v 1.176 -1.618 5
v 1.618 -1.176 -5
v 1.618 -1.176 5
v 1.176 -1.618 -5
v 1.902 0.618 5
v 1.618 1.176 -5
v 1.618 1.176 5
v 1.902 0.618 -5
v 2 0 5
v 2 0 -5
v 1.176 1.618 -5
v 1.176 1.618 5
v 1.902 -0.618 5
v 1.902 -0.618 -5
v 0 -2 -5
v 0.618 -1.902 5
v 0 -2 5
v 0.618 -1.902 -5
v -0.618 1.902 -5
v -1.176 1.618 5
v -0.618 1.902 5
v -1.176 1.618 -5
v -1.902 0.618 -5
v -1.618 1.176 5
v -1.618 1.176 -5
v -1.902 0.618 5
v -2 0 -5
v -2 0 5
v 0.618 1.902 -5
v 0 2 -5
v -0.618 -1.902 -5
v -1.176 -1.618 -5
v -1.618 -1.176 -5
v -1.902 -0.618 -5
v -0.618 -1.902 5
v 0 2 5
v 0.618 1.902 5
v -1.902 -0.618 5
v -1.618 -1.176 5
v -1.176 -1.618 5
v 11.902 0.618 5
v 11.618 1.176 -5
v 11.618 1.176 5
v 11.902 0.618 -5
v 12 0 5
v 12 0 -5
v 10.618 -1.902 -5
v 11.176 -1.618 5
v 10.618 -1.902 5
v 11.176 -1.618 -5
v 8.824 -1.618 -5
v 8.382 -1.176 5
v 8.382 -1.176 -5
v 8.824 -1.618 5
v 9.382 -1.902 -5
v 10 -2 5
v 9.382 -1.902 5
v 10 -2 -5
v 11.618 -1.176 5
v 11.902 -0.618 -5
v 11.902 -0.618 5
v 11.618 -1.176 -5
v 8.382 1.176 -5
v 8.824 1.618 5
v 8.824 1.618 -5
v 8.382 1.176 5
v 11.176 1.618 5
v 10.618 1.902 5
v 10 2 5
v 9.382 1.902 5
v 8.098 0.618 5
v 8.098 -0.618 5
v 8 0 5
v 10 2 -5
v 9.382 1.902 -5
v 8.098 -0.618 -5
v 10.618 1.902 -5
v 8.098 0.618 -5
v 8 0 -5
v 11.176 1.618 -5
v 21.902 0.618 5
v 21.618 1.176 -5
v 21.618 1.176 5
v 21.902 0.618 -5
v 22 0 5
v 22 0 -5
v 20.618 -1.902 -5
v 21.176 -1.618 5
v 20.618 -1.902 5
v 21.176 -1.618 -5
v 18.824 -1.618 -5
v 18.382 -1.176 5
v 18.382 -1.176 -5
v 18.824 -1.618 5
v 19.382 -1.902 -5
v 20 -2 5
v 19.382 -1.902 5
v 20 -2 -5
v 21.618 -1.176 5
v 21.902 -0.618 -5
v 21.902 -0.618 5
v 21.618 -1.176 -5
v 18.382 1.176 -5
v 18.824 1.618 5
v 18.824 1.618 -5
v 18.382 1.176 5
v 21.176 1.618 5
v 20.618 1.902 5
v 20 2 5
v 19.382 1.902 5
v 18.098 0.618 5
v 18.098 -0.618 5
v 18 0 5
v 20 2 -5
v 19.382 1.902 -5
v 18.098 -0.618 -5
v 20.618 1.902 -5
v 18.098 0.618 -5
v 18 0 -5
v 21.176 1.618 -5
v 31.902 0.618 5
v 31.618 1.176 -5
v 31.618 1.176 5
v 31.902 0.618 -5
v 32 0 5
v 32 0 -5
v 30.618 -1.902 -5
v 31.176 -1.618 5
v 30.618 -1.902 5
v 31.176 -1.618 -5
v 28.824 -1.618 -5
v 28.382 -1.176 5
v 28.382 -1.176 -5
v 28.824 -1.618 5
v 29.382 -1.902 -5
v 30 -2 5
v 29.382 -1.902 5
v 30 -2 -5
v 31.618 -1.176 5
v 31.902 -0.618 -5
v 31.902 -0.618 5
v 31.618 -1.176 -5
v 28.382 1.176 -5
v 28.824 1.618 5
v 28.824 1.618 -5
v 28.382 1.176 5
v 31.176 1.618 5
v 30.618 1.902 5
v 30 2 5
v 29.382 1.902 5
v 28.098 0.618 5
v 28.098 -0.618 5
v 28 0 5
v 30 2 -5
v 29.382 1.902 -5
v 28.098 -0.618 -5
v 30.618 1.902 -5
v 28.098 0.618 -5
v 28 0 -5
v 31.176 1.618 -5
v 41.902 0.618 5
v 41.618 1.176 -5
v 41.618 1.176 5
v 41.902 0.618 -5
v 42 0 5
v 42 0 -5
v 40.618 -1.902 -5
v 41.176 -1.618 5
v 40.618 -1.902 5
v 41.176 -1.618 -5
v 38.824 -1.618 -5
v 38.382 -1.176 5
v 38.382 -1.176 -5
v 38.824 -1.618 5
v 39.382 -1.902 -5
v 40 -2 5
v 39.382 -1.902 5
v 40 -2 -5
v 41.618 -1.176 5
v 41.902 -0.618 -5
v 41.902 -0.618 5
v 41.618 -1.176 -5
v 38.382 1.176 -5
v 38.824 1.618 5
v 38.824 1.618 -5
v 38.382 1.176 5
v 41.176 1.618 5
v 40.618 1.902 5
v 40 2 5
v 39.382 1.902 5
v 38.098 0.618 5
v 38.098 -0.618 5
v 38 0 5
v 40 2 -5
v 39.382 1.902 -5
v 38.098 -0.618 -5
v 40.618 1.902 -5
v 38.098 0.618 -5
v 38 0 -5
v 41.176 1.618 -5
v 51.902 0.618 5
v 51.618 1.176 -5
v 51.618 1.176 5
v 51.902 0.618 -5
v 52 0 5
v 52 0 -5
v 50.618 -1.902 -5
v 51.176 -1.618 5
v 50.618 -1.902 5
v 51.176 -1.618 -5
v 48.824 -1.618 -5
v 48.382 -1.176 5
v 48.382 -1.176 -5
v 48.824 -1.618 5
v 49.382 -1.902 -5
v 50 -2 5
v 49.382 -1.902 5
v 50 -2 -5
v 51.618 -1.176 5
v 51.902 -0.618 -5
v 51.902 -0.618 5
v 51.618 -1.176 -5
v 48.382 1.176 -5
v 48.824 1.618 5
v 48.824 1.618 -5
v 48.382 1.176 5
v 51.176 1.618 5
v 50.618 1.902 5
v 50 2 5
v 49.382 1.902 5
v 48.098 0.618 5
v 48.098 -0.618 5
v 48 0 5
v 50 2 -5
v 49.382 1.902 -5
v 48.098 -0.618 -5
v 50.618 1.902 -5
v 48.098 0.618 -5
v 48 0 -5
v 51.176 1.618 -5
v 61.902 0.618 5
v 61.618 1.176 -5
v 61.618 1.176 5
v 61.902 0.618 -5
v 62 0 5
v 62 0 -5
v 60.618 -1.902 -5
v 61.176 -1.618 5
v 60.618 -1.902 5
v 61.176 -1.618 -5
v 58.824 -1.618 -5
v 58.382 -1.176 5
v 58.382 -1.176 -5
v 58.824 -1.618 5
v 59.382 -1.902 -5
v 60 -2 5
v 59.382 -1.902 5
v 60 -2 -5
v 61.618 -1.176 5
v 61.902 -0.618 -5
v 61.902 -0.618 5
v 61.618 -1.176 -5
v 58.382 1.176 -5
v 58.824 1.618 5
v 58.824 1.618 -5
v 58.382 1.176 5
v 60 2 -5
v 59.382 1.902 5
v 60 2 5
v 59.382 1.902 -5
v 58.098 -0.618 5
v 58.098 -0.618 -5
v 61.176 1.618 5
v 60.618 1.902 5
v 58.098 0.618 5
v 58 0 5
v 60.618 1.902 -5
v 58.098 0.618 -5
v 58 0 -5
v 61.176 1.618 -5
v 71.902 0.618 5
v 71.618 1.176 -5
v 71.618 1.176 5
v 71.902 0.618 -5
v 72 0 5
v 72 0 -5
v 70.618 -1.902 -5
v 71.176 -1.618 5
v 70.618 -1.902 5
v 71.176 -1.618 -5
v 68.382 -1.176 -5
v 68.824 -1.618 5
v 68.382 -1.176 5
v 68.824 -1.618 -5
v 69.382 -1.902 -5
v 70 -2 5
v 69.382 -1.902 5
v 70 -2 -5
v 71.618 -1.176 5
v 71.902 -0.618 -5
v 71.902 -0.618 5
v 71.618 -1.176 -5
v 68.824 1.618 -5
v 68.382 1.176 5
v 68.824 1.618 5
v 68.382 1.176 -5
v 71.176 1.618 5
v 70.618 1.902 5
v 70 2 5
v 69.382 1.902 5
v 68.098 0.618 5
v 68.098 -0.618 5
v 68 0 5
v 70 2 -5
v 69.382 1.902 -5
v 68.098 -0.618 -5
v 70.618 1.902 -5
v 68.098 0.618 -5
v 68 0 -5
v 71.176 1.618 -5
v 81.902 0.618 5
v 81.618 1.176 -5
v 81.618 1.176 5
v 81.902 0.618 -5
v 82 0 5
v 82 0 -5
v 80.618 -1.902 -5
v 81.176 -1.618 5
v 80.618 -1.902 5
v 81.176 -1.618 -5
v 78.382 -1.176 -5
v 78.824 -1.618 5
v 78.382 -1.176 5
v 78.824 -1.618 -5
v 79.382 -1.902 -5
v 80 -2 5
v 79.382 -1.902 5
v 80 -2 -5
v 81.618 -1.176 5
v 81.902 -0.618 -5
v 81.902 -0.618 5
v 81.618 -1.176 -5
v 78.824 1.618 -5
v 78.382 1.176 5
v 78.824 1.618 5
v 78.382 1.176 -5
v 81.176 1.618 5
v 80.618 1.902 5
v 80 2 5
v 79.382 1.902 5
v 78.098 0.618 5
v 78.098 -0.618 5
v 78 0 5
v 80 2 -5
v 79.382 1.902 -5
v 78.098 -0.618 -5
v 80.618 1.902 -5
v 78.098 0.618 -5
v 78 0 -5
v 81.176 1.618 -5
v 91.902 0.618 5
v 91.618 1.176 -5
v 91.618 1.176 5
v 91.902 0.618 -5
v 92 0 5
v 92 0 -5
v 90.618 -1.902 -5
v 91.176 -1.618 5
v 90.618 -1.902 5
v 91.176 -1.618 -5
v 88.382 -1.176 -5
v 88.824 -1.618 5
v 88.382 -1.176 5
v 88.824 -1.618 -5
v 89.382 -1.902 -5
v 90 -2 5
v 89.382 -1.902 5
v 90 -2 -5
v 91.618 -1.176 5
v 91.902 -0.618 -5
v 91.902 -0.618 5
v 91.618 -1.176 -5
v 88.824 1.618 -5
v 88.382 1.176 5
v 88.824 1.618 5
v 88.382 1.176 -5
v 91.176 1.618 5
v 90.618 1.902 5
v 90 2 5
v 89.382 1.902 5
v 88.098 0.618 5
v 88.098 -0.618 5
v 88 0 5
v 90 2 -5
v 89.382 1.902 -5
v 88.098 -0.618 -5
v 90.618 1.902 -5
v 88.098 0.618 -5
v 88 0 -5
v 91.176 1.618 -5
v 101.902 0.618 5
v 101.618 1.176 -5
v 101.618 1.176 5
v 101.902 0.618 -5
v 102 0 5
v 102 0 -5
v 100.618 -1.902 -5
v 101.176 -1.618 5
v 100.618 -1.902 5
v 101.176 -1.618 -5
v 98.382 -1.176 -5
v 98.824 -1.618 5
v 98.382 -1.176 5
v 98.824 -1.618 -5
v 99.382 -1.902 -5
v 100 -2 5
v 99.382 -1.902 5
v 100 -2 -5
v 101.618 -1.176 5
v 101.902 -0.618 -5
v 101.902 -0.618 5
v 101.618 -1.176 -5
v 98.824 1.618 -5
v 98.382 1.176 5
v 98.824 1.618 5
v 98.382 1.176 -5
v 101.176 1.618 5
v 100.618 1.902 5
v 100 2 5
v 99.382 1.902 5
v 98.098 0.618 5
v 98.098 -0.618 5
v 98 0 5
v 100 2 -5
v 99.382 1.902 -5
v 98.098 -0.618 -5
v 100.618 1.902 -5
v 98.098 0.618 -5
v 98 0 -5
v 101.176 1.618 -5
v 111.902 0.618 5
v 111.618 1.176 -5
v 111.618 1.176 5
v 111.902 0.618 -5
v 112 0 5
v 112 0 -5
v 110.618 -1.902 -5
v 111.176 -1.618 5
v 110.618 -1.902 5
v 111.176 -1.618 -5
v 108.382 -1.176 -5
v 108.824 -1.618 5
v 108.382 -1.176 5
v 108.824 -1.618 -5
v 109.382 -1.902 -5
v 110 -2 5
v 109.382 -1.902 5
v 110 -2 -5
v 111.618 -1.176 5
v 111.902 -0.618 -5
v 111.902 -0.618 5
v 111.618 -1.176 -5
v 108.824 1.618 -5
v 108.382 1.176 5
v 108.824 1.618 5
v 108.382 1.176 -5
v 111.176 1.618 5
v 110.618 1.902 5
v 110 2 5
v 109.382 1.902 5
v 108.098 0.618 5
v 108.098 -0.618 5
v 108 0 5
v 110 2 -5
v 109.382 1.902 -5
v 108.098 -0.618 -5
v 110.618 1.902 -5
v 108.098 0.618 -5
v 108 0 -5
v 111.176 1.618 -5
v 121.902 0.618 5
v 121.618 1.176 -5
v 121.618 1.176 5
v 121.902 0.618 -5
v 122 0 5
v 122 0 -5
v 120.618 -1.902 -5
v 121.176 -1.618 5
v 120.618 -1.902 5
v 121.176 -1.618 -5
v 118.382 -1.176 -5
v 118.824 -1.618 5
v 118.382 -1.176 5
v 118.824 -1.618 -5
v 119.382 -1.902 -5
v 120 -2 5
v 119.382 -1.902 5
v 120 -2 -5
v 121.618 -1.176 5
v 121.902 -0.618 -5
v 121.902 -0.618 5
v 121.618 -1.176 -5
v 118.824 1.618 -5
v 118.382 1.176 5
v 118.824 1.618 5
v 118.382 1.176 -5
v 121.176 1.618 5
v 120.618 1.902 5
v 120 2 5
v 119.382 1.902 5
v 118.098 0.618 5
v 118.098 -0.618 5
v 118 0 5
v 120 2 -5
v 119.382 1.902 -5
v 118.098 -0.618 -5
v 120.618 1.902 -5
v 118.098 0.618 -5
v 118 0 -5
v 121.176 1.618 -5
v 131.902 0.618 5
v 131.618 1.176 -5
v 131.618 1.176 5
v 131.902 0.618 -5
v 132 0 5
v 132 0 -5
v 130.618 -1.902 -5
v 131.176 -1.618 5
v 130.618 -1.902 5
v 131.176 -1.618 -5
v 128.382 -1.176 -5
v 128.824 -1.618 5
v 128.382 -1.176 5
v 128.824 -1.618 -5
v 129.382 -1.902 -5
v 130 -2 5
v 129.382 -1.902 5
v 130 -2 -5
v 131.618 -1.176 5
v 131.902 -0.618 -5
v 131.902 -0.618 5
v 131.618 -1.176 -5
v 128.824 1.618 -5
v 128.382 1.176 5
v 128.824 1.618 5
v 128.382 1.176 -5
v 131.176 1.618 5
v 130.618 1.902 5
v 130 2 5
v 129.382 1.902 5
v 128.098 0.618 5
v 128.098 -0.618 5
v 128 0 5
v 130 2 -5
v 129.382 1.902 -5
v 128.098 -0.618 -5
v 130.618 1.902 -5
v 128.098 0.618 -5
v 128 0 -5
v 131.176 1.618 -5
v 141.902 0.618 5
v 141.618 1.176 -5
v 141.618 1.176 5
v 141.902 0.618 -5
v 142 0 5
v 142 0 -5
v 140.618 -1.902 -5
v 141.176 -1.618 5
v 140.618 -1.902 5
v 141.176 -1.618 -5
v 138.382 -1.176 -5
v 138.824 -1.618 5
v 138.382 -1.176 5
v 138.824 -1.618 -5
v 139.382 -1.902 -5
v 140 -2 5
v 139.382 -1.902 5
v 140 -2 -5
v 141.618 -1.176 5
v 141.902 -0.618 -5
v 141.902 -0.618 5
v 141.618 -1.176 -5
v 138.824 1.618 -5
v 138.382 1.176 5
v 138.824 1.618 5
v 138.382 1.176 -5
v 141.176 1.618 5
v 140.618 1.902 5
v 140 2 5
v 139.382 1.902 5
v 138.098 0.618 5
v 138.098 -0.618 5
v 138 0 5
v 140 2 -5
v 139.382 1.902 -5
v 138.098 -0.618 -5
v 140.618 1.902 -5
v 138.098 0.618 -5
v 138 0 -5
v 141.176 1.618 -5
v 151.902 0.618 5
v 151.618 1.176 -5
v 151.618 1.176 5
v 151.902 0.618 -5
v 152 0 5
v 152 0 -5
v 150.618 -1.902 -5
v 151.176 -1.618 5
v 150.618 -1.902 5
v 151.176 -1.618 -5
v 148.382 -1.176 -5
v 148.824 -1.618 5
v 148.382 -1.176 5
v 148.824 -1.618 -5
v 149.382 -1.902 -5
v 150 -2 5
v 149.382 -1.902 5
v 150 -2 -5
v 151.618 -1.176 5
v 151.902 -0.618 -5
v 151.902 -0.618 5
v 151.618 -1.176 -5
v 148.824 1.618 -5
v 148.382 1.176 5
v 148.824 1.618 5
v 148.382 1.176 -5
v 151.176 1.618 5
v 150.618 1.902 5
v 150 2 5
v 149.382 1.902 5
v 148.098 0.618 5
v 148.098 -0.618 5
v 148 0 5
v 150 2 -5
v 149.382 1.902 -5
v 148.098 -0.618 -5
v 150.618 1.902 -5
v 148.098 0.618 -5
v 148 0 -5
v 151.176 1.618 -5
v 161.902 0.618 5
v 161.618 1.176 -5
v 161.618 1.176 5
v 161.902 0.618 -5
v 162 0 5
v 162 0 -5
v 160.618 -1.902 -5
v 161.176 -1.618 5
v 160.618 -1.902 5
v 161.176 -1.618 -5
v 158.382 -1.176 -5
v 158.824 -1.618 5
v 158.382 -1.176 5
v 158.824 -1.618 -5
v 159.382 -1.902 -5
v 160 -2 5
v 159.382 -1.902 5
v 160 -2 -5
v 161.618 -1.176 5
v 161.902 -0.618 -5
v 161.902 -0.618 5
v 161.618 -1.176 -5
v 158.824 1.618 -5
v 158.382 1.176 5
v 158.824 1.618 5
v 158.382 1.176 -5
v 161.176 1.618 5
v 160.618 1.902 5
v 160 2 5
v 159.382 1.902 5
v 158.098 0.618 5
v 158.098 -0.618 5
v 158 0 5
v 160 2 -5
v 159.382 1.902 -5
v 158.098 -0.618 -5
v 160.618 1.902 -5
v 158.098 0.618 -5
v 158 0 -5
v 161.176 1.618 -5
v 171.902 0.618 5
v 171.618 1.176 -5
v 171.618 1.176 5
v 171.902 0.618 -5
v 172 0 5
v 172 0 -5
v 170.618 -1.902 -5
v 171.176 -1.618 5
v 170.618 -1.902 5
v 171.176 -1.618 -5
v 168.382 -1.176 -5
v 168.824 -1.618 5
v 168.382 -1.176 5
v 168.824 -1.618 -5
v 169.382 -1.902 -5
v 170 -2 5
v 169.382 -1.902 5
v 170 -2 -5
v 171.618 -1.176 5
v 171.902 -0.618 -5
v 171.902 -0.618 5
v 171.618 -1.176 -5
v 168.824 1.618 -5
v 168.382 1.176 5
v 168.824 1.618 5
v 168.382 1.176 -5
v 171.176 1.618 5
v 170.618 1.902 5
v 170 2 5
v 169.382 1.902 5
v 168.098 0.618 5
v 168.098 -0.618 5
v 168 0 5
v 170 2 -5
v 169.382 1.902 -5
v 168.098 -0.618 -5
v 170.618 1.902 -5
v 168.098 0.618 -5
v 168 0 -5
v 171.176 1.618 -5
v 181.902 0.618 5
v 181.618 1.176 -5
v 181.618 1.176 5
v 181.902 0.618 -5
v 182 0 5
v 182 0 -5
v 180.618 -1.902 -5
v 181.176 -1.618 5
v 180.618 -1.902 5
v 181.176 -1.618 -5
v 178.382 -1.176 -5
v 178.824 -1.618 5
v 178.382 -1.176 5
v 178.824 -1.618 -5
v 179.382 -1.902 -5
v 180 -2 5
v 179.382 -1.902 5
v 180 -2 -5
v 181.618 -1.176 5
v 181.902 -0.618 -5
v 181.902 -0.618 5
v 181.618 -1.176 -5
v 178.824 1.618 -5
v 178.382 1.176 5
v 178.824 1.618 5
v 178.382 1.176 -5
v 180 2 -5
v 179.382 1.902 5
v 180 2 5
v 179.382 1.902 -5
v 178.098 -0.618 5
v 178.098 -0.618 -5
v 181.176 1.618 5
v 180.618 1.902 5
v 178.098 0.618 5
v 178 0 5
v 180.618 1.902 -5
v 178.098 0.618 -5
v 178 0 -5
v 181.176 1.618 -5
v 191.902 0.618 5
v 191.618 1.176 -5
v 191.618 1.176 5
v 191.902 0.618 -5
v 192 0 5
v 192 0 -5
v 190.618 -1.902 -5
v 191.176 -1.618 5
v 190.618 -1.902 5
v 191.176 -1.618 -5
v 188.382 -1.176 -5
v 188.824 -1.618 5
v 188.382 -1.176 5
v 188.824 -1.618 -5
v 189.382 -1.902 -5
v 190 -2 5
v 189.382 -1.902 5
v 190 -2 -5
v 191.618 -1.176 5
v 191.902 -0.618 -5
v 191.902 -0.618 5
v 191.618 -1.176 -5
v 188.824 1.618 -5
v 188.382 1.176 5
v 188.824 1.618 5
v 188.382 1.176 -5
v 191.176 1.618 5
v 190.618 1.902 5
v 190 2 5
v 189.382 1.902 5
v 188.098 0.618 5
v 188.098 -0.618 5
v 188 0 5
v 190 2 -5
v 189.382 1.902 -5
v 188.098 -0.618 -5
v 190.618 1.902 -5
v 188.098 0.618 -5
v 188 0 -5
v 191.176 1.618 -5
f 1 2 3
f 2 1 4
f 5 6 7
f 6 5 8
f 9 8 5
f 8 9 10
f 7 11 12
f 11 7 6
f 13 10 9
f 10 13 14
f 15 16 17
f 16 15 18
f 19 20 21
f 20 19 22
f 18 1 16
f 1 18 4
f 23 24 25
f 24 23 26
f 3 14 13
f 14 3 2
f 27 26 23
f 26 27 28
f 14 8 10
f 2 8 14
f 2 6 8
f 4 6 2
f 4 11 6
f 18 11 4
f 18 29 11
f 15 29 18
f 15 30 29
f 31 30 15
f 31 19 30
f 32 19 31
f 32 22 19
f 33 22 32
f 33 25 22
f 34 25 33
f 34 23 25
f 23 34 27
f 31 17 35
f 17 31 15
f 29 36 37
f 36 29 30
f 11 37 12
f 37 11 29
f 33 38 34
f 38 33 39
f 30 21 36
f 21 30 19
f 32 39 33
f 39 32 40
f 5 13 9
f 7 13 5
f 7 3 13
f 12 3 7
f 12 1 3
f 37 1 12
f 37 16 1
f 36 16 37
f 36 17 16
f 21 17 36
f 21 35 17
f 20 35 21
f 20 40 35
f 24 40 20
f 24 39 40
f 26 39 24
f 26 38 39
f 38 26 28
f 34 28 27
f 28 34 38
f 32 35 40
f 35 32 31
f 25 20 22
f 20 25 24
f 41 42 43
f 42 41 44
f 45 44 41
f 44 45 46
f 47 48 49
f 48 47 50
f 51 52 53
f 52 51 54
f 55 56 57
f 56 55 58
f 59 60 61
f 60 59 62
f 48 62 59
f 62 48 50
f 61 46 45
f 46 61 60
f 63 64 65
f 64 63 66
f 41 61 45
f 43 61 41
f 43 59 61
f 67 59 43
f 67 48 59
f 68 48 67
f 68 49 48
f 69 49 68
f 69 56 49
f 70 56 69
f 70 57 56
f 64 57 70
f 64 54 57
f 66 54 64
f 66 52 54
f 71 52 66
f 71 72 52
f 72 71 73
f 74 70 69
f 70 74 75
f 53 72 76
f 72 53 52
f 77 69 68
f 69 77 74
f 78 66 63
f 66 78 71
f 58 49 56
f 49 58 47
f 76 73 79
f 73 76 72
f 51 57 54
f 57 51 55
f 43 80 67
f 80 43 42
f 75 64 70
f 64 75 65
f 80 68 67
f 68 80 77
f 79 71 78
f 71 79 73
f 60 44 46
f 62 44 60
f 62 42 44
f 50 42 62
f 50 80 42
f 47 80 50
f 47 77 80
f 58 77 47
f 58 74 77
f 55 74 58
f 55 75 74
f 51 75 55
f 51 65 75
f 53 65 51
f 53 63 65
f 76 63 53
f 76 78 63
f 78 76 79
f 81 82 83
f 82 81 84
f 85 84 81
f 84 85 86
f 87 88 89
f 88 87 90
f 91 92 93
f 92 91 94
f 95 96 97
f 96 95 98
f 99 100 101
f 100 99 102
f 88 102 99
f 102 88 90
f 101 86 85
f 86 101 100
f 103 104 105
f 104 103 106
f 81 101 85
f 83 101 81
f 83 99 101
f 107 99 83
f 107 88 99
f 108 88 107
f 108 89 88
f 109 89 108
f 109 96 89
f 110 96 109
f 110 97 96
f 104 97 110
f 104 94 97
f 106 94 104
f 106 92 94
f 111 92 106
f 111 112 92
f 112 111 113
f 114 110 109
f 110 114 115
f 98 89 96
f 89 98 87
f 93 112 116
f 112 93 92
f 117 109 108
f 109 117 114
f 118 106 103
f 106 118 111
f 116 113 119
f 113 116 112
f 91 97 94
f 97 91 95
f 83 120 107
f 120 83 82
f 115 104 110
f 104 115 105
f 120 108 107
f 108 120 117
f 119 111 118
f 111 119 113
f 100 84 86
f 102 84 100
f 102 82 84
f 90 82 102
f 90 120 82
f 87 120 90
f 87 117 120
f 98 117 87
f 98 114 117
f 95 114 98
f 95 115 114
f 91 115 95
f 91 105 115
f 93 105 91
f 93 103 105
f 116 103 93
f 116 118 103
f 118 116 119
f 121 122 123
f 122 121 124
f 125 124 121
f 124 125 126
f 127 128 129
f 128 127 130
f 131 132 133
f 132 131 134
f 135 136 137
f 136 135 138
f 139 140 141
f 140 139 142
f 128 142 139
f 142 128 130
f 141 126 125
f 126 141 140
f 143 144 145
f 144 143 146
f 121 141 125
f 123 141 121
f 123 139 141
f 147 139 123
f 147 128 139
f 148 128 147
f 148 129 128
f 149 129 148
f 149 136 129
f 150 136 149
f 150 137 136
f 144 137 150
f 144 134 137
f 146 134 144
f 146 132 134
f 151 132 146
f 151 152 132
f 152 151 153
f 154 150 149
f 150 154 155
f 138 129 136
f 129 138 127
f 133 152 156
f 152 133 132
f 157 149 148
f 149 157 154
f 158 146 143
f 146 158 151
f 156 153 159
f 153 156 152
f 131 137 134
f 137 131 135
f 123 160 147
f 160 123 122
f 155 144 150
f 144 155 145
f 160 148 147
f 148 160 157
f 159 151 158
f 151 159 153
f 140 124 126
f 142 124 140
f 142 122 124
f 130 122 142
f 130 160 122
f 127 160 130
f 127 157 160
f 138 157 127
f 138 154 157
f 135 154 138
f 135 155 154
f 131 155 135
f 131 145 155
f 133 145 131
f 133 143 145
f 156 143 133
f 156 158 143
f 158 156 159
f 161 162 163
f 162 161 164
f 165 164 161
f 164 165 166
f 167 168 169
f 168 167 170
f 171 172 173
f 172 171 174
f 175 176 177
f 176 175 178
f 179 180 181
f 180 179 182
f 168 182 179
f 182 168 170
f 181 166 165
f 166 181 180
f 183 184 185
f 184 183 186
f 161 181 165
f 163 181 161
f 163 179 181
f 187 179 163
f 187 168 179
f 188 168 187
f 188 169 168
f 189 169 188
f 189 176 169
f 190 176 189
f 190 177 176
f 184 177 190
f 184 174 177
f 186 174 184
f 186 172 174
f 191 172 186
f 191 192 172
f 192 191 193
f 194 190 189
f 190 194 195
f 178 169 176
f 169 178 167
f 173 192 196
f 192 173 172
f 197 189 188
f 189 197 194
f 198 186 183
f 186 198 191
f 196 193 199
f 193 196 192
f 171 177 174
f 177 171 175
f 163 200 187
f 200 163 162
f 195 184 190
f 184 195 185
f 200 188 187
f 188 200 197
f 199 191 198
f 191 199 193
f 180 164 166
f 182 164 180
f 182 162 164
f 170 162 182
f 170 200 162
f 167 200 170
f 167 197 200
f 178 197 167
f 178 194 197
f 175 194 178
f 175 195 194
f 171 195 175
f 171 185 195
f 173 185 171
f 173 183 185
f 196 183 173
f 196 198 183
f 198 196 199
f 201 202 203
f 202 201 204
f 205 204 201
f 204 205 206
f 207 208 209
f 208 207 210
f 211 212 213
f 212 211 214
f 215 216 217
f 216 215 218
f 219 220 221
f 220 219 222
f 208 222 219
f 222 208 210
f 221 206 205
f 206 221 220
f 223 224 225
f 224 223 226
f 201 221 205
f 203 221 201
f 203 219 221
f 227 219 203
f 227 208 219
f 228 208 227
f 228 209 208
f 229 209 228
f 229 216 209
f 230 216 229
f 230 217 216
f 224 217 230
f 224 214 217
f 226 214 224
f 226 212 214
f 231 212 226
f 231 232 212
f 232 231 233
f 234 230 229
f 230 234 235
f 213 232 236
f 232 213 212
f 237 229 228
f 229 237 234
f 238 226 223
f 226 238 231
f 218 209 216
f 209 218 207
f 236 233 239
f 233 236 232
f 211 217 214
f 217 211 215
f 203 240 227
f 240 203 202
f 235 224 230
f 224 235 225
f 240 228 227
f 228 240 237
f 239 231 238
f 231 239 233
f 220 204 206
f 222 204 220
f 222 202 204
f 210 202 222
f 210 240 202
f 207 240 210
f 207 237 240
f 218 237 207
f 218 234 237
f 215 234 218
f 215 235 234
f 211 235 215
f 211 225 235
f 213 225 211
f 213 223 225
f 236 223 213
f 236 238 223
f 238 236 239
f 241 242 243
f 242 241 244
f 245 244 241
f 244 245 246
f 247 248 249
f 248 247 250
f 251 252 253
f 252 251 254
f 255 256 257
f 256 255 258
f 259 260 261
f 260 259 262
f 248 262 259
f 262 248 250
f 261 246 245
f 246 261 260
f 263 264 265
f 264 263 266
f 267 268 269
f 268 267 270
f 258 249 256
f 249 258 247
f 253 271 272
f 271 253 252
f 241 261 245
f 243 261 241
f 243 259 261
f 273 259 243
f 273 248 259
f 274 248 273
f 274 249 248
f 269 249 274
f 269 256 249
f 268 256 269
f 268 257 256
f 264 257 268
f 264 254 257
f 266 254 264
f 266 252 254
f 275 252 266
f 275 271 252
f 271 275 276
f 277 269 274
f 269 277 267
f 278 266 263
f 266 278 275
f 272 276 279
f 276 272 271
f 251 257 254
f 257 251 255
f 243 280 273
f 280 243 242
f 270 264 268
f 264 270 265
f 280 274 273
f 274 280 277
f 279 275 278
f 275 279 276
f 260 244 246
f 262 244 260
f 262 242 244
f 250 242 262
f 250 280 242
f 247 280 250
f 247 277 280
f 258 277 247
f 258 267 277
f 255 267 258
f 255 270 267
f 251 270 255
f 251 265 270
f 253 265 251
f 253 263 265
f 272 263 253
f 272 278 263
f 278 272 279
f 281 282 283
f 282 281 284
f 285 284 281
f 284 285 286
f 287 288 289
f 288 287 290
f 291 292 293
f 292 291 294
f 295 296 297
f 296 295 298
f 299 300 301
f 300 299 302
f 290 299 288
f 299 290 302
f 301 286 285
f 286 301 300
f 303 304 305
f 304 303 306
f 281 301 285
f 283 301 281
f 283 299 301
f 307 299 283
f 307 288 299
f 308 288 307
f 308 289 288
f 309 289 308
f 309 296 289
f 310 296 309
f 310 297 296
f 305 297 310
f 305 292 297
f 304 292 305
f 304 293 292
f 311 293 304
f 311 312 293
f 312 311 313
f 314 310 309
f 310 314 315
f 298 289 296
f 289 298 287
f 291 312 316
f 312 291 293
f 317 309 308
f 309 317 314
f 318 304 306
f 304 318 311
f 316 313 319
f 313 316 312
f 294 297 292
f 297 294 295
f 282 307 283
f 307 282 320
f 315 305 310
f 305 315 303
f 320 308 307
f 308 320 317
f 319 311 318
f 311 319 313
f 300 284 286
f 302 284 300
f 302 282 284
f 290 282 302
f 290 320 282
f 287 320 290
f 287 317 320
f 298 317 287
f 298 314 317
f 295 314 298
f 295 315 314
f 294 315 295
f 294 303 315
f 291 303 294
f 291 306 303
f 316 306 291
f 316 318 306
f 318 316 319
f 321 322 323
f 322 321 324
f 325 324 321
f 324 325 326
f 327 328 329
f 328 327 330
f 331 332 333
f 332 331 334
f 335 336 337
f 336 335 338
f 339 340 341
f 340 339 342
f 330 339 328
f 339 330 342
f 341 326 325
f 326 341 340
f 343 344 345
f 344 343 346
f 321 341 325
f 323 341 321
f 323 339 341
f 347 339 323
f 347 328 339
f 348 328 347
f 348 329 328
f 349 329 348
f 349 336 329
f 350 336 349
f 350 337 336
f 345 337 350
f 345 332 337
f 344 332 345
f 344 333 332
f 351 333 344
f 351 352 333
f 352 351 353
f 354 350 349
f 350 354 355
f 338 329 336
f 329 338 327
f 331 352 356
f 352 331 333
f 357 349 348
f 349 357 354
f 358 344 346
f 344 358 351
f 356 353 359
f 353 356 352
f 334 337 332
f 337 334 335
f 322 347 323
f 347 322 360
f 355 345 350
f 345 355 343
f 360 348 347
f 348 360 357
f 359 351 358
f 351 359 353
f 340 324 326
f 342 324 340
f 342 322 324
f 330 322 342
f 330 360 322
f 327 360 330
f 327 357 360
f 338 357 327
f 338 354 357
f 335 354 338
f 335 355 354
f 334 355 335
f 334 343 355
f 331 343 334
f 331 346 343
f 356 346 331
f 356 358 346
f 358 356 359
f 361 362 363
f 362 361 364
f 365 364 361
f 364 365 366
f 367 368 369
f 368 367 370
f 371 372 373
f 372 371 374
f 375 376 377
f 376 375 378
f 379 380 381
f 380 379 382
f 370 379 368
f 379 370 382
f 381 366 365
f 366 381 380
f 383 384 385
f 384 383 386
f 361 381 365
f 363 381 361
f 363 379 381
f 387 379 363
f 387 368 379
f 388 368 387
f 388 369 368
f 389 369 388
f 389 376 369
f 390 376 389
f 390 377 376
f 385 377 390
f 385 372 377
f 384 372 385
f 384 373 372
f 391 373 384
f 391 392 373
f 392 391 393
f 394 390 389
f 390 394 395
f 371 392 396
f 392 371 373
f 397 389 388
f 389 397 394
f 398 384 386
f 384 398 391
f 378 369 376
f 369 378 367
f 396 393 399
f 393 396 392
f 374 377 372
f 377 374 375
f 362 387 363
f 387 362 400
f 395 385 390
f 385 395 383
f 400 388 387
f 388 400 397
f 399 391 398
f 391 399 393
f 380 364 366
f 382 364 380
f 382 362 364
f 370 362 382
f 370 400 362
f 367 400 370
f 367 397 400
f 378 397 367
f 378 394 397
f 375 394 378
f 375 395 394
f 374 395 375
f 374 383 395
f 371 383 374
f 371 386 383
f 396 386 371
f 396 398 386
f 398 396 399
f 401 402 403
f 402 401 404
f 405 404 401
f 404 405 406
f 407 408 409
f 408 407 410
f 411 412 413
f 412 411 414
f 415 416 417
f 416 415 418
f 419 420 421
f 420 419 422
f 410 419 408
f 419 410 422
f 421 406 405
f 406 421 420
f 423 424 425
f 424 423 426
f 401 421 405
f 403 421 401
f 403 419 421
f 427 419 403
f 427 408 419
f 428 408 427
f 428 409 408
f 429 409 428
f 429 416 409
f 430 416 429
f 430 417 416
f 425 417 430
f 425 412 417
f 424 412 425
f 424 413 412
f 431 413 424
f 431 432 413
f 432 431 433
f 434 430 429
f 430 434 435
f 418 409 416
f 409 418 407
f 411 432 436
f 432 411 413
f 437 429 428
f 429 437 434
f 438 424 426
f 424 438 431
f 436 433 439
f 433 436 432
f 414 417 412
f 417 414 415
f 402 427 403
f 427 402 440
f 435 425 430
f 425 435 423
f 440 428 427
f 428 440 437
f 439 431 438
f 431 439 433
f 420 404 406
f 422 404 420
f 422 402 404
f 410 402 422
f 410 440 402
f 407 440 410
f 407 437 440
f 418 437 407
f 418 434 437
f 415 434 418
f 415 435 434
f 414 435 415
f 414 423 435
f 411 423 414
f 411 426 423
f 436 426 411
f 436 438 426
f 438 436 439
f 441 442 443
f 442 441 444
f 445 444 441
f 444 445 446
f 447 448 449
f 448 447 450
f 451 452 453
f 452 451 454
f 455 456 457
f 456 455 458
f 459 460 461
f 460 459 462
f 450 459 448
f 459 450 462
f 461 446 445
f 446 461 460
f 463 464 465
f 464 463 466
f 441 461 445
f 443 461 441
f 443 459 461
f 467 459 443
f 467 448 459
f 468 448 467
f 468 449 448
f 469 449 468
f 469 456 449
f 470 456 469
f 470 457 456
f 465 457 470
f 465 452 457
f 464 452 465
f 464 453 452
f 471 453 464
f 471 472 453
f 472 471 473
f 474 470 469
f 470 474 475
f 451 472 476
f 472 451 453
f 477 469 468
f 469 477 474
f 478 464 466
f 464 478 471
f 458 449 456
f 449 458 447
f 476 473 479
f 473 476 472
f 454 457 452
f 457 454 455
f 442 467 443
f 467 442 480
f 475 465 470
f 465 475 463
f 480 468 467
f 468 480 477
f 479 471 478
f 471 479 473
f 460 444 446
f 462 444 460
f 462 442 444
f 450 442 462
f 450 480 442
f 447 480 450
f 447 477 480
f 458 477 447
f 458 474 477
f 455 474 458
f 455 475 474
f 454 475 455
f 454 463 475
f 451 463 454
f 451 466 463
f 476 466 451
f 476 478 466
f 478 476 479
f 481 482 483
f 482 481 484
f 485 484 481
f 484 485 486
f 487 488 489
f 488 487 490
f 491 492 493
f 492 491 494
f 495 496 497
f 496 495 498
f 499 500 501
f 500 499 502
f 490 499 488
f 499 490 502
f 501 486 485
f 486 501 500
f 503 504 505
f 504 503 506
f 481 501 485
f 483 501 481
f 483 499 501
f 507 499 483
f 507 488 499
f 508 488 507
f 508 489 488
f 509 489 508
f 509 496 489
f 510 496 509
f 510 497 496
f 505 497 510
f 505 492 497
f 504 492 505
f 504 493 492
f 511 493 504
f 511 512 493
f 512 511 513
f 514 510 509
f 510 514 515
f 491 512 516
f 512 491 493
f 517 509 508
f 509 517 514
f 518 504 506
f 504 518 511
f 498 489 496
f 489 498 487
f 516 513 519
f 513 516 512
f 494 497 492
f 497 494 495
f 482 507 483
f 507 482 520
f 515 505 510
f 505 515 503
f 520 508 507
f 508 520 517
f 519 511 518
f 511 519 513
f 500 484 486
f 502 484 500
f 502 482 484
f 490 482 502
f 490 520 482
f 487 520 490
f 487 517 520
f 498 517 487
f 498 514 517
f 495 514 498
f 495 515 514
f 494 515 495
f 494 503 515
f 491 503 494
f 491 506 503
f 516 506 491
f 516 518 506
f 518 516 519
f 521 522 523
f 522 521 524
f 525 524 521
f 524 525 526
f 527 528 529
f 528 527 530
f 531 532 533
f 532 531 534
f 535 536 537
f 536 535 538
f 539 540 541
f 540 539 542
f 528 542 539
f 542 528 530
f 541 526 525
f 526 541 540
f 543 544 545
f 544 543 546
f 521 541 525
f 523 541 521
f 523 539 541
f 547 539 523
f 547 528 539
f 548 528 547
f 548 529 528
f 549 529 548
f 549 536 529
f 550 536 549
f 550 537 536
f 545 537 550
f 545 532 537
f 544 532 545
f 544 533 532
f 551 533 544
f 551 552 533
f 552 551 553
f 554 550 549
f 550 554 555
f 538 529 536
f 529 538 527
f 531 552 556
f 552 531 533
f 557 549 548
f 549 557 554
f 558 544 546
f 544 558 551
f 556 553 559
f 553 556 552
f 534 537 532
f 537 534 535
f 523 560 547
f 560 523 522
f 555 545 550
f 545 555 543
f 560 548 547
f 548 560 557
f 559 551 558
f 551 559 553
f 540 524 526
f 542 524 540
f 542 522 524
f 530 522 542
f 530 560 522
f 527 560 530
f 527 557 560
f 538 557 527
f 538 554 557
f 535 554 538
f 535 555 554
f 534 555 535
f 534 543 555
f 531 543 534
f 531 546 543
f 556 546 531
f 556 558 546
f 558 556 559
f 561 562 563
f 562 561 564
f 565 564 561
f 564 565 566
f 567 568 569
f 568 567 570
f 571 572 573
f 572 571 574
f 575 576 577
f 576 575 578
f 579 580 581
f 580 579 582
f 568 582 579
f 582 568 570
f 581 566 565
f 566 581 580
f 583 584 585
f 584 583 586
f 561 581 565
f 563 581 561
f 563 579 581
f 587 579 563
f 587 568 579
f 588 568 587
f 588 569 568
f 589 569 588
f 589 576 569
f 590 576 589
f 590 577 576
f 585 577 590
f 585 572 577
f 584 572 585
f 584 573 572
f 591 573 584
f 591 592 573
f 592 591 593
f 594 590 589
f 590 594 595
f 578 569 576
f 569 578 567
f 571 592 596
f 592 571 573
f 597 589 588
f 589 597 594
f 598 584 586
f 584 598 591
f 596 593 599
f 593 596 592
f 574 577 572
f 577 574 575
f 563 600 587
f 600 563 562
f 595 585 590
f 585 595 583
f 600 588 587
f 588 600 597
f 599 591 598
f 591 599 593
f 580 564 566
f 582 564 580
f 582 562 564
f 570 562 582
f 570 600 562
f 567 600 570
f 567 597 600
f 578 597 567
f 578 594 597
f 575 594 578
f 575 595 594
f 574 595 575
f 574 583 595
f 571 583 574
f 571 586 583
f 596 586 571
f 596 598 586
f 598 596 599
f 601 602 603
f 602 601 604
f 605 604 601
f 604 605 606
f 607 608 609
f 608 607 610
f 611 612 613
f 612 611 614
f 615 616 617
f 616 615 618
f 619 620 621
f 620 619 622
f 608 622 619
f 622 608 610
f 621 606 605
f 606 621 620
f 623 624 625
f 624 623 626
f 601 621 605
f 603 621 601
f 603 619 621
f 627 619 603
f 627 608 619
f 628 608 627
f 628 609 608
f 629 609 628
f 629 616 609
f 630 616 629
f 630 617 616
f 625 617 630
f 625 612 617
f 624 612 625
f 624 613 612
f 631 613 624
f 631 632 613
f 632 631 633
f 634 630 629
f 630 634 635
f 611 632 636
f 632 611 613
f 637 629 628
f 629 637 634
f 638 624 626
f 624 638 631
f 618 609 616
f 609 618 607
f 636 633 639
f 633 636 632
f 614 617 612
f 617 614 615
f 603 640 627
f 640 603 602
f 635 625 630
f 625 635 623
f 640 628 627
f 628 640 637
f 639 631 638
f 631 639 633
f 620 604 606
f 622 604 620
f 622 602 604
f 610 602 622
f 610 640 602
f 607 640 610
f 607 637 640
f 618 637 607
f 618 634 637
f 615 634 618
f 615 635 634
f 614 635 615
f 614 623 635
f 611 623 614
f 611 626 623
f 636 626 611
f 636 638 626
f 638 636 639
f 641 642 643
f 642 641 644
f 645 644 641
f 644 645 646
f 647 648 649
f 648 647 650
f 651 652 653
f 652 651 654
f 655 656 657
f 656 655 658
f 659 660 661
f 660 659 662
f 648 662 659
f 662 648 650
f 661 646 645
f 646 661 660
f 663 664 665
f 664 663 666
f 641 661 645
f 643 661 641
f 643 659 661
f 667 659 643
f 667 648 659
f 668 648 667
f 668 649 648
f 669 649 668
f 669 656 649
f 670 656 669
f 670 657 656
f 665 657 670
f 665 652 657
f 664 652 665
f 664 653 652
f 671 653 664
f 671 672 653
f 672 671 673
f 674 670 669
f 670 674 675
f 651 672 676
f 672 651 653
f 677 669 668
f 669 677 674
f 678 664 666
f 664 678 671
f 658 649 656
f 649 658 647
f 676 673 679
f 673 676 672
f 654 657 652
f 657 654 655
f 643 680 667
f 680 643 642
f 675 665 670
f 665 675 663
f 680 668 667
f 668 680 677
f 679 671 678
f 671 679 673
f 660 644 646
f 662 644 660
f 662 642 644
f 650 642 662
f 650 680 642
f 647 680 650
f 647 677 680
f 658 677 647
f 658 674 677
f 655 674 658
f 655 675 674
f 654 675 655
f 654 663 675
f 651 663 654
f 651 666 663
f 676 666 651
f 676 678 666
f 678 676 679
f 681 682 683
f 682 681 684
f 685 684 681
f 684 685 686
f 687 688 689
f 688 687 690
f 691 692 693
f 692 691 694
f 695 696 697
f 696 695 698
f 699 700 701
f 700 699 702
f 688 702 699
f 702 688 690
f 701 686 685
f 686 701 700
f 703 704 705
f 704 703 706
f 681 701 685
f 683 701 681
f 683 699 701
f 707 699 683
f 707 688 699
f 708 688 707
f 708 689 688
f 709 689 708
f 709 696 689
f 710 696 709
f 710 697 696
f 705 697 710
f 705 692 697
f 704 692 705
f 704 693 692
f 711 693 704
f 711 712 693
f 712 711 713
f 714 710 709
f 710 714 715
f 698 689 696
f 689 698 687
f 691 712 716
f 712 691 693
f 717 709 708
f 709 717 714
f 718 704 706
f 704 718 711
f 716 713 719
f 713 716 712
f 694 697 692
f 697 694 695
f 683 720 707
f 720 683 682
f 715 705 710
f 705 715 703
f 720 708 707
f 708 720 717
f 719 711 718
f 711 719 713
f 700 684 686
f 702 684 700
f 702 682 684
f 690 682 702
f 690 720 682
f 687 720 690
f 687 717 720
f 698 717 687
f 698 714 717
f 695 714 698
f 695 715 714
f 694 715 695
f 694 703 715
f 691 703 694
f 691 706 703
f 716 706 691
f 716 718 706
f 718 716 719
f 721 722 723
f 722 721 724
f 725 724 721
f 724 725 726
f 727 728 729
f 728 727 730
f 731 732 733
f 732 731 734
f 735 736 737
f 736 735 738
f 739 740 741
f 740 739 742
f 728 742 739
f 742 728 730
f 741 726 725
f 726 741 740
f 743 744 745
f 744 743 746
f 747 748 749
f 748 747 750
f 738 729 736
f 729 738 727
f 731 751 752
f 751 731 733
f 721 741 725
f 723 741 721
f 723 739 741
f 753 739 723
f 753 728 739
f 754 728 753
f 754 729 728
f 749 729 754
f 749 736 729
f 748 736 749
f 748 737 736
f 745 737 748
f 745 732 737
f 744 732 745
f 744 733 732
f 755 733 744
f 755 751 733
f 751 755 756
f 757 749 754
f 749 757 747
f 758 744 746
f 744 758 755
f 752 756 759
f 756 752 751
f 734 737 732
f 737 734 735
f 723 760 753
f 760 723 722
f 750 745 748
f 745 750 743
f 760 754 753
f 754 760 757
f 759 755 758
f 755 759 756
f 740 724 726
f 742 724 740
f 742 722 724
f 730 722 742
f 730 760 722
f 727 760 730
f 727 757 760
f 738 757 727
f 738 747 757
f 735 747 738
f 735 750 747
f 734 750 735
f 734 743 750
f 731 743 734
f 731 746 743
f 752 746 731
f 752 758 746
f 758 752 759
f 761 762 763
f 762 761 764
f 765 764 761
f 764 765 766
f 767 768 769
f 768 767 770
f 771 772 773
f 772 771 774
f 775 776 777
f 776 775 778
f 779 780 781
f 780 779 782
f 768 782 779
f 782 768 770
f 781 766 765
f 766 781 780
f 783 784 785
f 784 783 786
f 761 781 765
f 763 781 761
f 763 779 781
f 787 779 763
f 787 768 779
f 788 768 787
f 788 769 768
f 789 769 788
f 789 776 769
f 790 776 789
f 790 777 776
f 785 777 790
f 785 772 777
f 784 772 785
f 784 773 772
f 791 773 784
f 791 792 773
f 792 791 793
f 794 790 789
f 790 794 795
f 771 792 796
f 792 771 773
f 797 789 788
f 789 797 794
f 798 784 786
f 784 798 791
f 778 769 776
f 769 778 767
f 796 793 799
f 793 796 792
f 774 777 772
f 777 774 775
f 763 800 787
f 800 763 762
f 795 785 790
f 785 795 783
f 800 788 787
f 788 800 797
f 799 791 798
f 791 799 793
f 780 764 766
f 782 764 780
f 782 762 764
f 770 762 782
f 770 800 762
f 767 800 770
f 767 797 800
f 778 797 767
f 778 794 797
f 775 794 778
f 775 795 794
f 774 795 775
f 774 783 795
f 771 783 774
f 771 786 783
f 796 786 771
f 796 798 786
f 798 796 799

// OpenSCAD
drill=4;
h1=10;
d=10;
n=20;

for(i=[0:n-1]){
    translate([i*d,0,0])
        cylinder(r=drill/2,h=h1,$fn=20,center=true);
}
